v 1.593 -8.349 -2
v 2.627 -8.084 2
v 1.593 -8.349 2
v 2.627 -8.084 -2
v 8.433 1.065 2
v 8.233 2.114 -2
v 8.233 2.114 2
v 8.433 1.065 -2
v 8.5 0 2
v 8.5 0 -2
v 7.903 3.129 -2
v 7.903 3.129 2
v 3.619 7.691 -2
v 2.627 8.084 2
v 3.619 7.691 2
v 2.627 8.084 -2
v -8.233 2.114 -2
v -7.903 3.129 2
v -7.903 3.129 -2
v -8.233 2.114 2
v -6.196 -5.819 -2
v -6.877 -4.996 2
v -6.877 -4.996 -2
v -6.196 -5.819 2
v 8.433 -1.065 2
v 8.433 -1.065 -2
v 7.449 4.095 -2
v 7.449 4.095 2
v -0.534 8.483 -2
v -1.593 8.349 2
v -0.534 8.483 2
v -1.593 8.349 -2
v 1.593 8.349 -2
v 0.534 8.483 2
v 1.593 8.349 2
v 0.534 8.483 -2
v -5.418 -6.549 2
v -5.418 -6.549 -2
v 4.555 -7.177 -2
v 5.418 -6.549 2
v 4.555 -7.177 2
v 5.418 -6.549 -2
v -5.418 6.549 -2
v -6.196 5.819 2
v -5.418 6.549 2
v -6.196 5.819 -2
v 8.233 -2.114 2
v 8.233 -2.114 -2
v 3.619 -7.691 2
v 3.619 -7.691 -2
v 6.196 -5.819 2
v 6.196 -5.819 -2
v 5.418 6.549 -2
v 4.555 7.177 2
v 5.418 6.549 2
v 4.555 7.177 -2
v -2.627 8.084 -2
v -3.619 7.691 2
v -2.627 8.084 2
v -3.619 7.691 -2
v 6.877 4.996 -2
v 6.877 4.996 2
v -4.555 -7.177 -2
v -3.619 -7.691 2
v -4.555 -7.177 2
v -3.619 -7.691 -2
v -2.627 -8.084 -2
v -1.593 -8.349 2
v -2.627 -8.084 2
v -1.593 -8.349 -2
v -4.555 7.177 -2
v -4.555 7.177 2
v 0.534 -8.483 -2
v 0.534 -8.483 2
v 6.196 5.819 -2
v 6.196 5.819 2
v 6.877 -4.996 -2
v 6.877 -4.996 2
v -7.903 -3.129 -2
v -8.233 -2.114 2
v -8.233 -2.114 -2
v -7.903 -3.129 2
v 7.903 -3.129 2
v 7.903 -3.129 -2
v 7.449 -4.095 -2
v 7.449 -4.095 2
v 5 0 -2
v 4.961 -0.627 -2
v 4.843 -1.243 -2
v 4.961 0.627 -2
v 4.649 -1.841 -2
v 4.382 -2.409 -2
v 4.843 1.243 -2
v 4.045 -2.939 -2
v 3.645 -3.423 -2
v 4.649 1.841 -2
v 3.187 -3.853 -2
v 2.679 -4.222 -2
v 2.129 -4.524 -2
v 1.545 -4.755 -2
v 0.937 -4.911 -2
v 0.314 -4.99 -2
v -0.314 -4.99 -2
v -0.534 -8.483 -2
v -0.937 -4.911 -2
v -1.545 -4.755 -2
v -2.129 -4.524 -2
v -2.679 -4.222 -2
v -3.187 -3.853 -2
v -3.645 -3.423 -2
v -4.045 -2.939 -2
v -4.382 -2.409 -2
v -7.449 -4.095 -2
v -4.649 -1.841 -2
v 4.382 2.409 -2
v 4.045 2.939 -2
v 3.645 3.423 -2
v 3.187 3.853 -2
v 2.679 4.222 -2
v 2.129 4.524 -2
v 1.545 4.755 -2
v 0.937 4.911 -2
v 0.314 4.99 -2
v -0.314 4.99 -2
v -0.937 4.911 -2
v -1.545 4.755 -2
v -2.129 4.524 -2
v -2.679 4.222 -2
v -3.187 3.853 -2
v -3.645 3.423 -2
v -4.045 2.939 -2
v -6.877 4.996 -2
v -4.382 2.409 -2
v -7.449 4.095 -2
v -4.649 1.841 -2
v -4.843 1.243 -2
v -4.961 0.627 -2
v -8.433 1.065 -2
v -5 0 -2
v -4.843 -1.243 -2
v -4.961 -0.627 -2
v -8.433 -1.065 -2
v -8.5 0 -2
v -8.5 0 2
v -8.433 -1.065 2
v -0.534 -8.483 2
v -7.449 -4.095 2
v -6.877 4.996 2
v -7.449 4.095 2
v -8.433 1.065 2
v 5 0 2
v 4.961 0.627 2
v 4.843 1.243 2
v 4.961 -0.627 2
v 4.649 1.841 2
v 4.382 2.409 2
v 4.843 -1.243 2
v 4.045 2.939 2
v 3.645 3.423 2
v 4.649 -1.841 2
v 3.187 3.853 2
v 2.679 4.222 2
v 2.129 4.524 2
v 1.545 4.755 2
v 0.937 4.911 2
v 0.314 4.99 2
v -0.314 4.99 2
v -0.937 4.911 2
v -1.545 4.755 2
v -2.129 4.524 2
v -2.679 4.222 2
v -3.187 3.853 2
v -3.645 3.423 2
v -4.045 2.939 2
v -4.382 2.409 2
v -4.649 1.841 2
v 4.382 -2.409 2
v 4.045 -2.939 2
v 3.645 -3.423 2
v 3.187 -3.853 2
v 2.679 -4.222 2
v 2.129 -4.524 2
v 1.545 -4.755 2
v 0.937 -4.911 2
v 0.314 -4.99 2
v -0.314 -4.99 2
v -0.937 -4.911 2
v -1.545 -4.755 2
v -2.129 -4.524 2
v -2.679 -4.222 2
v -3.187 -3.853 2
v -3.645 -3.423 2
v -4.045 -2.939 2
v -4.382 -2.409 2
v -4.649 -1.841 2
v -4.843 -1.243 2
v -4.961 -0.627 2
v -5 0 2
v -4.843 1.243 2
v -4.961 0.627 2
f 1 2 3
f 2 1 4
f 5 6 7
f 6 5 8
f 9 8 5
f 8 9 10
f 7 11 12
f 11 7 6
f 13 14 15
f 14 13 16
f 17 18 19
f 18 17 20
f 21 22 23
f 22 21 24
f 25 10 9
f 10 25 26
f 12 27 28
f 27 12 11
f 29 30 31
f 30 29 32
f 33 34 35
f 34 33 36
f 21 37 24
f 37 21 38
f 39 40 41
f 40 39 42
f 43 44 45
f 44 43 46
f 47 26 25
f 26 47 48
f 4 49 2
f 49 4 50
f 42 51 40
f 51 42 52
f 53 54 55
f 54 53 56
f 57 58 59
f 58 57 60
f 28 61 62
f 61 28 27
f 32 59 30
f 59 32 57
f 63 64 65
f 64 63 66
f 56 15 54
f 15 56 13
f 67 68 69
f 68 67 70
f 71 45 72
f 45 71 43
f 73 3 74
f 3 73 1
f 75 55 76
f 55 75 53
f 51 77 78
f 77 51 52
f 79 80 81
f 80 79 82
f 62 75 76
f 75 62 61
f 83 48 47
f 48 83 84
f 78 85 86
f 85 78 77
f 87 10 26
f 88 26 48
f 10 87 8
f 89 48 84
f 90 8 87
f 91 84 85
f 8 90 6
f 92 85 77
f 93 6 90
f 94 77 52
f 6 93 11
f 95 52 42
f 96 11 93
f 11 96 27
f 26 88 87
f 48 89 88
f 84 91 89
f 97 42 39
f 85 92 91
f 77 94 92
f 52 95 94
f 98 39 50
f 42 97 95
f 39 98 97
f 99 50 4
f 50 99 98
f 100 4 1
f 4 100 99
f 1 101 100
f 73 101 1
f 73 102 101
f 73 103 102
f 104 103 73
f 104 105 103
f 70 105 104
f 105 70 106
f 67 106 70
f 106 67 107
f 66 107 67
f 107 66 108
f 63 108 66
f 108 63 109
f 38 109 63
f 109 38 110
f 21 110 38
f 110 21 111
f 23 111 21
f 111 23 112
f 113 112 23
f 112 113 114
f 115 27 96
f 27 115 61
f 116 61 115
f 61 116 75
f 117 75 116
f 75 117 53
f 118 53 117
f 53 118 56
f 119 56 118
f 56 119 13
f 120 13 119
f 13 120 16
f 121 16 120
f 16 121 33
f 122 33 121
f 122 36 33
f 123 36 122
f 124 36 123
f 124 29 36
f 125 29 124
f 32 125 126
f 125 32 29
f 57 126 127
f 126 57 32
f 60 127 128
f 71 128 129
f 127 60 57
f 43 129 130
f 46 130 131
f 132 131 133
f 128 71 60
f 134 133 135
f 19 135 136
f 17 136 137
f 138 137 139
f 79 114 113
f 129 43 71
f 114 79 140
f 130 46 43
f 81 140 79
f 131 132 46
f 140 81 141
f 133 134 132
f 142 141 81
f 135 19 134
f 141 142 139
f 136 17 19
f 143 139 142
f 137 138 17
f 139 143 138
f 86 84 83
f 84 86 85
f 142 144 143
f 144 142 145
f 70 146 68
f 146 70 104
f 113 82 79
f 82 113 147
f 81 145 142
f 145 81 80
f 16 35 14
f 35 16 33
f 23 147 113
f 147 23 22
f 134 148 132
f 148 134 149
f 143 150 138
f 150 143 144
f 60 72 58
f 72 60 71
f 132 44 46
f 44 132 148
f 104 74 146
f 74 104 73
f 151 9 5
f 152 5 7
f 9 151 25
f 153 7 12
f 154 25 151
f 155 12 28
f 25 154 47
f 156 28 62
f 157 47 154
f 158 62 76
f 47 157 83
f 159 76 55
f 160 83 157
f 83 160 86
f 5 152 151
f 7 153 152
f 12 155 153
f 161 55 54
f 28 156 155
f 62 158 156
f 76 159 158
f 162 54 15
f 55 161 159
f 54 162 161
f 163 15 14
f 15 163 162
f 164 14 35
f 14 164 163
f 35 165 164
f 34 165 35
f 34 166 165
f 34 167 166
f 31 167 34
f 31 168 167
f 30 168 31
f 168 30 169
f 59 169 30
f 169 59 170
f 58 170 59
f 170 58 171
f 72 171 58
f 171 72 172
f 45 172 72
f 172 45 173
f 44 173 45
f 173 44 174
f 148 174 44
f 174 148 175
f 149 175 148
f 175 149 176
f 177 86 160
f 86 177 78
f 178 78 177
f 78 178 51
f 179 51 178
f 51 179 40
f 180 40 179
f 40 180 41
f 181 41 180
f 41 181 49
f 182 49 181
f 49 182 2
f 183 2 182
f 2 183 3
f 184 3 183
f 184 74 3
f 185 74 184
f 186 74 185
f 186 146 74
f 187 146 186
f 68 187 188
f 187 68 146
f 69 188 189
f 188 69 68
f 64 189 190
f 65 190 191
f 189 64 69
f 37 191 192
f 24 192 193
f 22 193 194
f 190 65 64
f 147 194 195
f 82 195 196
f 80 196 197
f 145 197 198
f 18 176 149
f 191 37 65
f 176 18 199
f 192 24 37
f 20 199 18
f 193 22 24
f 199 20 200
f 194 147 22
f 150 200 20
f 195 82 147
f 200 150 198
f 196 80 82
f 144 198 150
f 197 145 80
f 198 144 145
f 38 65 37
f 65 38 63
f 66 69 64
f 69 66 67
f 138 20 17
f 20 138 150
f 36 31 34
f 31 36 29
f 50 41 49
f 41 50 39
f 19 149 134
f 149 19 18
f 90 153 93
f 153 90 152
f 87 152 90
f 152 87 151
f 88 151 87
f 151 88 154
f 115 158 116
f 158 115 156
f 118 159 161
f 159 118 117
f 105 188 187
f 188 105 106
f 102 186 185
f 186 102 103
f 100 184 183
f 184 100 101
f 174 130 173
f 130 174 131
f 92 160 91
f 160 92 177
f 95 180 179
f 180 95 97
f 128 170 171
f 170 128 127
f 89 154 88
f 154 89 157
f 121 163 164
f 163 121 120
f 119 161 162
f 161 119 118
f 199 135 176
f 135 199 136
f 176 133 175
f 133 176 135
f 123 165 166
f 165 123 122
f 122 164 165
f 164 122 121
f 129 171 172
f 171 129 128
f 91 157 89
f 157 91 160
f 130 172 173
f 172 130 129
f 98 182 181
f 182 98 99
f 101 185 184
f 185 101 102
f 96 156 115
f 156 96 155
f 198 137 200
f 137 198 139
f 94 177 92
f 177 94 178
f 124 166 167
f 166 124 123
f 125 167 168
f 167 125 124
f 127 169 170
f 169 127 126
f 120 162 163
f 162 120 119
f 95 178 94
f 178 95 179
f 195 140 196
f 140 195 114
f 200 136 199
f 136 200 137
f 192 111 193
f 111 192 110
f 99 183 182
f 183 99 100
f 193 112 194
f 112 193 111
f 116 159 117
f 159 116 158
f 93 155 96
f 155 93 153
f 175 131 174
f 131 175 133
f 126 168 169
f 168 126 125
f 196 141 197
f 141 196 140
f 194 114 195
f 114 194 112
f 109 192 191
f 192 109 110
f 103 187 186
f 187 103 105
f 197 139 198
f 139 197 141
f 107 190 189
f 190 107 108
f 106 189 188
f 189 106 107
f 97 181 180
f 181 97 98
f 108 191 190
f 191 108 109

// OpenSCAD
$fn = 50;


difference() {
	union() {
		translate(v = [0, 0, -2.0000000000]) {
			cylinder(h = 4, r = 8.5000000000);
		}
	}
	union() {
		translate(v = [0, 0, -100.0000000000]) {
			cylinder(h = 200, r = 5.0000000000);
		}
	}
}
